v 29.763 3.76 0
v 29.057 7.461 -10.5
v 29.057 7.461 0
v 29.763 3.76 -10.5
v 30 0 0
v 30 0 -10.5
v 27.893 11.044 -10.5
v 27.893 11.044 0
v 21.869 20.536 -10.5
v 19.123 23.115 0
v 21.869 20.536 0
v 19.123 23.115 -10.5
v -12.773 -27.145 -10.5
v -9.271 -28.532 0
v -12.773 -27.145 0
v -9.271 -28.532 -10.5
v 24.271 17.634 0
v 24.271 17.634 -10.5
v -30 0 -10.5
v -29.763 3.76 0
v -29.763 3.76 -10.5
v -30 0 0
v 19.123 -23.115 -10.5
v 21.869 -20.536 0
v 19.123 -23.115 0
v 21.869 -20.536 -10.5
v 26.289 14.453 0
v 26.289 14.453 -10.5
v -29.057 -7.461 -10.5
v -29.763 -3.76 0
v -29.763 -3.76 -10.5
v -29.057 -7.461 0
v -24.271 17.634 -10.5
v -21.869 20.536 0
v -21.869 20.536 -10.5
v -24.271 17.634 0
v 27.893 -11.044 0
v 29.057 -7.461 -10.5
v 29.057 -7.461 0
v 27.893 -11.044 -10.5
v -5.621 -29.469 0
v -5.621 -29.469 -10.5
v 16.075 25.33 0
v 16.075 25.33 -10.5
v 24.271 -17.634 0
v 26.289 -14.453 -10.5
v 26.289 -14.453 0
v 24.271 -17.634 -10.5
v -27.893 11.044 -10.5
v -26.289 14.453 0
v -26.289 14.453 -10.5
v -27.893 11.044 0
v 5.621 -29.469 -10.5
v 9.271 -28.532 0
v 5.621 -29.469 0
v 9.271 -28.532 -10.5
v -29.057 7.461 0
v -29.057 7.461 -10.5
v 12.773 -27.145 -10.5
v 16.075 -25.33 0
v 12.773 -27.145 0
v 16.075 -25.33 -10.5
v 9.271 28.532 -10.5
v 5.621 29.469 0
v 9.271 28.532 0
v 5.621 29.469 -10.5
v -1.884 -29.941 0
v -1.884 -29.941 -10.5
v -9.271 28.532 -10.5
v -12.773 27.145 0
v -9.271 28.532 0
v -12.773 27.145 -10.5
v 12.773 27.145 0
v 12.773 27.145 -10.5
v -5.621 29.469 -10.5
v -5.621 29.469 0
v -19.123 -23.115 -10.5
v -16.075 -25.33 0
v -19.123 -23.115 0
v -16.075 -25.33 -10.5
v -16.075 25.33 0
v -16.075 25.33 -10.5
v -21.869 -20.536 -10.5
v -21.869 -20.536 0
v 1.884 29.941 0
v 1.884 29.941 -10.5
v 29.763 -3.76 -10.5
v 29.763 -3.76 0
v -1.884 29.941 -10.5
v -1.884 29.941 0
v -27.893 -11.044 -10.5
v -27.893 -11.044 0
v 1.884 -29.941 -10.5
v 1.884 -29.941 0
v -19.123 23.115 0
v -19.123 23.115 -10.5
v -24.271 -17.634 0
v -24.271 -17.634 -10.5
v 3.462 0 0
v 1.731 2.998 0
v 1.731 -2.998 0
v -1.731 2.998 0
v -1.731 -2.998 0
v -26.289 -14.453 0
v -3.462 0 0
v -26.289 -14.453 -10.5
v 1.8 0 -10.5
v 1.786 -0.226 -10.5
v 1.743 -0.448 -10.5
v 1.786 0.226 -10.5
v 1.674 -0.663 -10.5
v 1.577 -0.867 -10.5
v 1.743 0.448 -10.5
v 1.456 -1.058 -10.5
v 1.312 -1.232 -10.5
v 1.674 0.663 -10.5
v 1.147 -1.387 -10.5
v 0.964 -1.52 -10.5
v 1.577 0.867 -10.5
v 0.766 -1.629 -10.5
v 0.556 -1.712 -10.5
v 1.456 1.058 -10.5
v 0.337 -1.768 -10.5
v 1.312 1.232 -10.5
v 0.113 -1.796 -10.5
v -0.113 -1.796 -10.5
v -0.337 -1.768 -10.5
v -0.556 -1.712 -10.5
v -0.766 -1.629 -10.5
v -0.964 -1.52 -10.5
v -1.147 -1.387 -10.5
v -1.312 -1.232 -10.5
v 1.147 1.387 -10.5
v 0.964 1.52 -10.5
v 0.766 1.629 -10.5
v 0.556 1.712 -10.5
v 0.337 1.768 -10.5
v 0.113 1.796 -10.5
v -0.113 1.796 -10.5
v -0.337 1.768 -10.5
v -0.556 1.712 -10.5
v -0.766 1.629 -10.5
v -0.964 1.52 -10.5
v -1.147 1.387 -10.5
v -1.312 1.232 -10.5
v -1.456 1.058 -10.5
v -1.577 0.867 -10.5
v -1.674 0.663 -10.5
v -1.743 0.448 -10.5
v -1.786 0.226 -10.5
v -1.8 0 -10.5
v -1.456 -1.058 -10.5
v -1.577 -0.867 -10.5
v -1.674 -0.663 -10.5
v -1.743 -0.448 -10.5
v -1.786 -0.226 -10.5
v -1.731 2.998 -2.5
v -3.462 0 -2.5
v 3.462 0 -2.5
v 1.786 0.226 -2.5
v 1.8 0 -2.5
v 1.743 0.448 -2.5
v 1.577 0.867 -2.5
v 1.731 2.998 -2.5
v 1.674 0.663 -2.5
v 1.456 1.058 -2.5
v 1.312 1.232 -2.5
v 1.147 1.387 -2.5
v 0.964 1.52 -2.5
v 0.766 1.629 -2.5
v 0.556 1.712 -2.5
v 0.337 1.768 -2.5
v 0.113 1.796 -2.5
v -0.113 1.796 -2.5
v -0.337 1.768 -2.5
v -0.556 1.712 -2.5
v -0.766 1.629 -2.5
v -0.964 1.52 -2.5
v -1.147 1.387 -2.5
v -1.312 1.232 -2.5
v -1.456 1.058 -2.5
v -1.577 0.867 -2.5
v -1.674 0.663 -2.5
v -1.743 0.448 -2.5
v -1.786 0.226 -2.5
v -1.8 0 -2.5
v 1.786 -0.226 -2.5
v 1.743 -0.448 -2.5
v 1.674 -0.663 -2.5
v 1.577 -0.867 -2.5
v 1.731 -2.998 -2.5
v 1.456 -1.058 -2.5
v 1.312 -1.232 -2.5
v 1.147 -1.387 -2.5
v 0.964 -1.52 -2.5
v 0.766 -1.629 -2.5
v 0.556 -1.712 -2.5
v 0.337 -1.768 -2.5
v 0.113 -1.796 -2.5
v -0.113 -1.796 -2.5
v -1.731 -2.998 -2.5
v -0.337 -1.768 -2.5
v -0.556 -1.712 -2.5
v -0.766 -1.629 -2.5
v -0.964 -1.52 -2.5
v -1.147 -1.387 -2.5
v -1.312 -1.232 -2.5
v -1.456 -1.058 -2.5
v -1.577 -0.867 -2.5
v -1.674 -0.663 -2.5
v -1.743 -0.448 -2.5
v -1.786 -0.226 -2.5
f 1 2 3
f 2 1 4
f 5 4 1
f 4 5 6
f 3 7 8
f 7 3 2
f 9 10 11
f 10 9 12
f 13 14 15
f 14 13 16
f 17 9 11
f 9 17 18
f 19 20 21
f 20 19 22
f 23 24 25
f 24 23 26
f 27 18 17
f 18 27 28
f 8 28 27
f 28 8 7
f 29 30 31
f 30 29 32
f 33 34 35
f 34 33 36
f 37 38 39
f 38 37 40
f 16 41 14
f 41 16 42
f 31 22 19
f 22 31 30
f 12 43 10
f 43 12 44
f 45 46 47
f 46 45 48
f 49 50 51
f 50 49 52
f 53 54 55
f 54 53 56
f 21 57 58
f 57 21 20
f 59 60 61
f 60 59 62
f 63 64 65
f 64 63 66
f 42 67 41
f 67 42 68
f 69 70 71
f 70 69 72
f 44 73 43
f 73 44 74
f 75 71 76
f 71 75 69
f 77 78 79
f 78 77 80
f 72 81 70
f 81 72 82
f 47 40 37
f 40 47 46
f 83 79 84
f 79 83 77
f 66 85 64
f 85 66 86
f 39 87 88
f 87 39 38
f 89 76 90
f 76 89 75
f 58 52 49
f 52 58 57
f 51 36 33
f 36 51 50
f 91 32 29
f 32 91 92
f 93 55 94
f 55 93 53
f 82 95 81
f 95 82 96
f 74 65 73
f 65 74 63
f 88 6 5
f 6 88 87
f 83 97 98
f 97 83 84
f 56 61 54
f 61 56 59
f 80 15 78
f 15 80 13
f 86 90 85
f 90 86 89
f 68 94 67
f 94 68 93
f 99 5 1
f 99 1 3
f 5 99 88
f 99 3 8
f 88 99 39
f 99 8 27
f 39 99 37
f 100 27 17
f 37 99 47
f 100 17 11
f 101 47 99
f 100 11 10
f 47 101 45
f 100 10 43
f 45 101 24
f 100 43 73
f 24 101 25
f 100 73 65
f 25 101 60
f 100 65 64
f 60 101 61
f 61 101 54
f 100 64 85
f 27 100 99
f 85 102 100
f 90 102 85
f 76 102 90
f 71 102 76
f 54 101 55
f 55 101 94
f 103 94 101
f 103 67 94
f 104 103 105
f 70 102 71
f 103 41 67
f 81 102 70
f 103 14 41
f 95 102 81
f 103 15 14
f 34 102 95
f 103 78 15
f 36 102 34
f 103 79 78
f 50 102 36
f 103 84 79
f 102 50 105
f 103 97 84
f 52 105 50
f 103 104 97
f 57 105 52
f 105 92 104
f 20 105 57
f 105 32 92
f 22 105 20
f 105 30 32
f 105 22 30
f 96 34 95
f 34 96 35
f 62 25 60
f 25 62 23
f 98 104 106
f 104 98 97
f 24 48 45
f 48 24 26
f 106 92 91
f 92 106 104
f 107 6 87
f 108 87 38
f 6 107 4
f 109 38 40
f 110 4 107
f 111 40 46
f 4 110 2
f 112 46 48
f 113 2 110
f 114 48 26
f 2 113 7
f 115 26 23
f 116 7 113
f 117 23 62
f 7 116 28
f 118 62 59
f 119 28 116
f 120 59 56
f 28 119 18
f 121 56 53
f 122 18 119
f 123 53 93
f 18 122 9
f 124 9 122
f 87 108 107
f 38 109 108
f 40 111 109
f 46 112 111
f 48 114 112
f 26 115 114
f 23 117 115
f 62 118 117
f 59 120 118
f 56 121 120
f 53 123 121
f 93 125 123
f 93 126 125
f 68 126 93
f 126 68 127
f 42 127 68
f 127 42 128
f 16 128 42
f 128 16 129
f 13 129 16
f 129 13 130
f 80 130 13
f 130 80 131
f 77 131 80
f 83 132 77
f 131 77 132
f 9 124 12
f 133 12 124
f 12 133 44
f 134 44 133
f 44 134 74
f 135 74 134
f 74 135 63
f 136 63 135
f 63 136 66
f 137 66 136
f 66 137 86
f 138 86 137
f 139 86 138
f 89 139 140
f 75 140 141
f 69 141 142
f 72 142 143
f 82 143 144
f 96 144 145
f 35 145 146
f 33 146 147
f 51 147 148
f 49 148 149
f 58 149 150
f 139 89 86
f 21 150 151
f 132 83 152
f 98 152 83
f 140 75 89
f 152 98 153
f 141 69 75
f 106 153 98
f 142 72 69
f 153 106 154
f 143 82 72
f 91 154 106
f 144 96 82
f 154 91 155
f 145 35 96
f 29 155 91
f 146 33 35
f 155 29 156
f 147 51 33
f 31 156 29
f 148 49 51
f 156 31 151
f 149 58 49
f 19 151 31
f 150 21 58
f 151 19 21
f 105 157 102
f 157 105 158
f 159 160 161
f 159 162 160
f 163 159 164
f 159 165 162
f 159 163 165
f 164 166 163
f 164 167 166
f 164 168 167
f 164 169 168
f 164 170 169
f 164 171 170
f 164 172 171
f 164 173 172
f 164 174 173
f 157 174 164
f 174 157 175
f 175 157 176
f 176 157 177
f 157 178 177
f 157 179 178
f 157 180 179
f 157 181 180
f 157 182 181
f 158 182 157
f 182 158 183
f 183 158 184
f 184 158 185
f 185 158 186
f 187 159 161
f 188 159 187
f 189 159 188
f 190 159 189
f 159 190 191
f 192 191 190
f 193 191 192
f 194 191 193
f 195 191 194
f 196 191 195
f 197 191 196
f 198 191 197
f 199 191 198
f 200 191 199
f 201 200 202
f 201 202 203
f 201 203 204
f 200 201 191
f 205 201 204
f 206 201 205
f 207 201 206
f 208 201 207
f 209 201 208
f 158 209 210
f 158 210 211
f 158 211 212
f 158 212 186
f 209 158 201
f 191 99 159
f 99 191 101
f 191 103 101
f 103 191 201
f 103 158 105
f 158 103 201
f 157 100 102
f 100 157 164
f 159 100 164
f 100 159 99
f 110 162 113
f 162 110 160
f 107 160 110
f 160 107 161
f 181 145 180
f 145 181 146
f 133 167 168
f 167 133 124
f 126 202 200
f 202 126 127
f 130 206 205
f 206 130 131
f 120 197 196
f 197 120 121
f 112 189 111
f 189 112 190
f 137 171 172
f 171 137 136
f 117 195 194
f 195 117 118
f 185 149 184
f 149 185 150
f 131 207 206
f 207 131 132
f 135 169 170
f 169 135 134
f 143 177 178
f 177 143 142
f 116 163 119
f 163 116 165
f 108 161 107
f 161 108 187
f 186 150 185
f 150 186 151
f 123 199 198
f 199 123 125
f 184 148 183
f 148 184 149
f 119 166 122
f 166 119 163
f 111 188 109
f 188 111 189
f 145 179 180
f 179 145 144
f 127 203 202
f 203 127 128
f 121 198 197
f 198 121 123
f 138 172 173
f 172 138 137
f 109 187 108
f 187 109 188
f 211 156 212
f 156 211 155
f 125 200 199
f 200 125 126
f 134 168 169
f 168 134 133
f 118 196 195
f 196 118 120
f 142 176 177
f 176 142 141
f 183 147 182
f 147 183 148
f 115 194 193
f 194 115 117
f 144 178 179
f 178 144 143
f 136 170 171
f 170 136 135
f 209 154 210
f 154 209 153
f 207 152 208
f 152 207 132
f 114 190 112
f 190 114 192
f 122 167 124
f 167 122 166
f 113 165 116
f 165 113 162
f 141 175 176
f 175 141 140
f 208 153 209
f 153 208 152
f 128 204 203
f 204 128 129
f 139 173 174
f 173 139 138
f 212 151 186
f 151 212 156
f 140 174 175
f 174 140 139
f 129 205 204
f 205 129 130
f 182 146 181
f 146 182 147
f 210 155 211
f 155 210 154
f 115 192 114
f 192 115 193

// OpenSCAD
$fn = 50;


difference() {
	union() {
		translate(v = [0, 0, -10.5000000000]) {
			cylinder(h = 10.5000000000, r = 30.0000000000);
		}
		translate(v = [0, 0, -9.0000000000]) {
			cylinder(h = 9, r = 2.8750000000);
		}
	}
	union() {
		translate(v = [0, 0, 0]) {
			rotate(a = [0, 0, 0]) {
				difference() {
					union() {
						translate(v = [0, 0, -2.5000000000]) {
							linear_extrude(height = 2.5000000000) {
								polygon(points = [[3.4620000000, 0.0000000000], [1.7310000000, 2.9981799479], [-1.7310000000, 2.9981799479], [-3.4620000000, 0.0000000000], [-1.7310000000, -2.9981799479], [1.7310000000, -2.9981799479]]);
							}
						}
					}
					union();
				}
			}
		}
		#translate(v = [0, 0, -100.0000000000]) {
			cylinder(h = 200, r = 1.8000000000);
		}
	}
}
